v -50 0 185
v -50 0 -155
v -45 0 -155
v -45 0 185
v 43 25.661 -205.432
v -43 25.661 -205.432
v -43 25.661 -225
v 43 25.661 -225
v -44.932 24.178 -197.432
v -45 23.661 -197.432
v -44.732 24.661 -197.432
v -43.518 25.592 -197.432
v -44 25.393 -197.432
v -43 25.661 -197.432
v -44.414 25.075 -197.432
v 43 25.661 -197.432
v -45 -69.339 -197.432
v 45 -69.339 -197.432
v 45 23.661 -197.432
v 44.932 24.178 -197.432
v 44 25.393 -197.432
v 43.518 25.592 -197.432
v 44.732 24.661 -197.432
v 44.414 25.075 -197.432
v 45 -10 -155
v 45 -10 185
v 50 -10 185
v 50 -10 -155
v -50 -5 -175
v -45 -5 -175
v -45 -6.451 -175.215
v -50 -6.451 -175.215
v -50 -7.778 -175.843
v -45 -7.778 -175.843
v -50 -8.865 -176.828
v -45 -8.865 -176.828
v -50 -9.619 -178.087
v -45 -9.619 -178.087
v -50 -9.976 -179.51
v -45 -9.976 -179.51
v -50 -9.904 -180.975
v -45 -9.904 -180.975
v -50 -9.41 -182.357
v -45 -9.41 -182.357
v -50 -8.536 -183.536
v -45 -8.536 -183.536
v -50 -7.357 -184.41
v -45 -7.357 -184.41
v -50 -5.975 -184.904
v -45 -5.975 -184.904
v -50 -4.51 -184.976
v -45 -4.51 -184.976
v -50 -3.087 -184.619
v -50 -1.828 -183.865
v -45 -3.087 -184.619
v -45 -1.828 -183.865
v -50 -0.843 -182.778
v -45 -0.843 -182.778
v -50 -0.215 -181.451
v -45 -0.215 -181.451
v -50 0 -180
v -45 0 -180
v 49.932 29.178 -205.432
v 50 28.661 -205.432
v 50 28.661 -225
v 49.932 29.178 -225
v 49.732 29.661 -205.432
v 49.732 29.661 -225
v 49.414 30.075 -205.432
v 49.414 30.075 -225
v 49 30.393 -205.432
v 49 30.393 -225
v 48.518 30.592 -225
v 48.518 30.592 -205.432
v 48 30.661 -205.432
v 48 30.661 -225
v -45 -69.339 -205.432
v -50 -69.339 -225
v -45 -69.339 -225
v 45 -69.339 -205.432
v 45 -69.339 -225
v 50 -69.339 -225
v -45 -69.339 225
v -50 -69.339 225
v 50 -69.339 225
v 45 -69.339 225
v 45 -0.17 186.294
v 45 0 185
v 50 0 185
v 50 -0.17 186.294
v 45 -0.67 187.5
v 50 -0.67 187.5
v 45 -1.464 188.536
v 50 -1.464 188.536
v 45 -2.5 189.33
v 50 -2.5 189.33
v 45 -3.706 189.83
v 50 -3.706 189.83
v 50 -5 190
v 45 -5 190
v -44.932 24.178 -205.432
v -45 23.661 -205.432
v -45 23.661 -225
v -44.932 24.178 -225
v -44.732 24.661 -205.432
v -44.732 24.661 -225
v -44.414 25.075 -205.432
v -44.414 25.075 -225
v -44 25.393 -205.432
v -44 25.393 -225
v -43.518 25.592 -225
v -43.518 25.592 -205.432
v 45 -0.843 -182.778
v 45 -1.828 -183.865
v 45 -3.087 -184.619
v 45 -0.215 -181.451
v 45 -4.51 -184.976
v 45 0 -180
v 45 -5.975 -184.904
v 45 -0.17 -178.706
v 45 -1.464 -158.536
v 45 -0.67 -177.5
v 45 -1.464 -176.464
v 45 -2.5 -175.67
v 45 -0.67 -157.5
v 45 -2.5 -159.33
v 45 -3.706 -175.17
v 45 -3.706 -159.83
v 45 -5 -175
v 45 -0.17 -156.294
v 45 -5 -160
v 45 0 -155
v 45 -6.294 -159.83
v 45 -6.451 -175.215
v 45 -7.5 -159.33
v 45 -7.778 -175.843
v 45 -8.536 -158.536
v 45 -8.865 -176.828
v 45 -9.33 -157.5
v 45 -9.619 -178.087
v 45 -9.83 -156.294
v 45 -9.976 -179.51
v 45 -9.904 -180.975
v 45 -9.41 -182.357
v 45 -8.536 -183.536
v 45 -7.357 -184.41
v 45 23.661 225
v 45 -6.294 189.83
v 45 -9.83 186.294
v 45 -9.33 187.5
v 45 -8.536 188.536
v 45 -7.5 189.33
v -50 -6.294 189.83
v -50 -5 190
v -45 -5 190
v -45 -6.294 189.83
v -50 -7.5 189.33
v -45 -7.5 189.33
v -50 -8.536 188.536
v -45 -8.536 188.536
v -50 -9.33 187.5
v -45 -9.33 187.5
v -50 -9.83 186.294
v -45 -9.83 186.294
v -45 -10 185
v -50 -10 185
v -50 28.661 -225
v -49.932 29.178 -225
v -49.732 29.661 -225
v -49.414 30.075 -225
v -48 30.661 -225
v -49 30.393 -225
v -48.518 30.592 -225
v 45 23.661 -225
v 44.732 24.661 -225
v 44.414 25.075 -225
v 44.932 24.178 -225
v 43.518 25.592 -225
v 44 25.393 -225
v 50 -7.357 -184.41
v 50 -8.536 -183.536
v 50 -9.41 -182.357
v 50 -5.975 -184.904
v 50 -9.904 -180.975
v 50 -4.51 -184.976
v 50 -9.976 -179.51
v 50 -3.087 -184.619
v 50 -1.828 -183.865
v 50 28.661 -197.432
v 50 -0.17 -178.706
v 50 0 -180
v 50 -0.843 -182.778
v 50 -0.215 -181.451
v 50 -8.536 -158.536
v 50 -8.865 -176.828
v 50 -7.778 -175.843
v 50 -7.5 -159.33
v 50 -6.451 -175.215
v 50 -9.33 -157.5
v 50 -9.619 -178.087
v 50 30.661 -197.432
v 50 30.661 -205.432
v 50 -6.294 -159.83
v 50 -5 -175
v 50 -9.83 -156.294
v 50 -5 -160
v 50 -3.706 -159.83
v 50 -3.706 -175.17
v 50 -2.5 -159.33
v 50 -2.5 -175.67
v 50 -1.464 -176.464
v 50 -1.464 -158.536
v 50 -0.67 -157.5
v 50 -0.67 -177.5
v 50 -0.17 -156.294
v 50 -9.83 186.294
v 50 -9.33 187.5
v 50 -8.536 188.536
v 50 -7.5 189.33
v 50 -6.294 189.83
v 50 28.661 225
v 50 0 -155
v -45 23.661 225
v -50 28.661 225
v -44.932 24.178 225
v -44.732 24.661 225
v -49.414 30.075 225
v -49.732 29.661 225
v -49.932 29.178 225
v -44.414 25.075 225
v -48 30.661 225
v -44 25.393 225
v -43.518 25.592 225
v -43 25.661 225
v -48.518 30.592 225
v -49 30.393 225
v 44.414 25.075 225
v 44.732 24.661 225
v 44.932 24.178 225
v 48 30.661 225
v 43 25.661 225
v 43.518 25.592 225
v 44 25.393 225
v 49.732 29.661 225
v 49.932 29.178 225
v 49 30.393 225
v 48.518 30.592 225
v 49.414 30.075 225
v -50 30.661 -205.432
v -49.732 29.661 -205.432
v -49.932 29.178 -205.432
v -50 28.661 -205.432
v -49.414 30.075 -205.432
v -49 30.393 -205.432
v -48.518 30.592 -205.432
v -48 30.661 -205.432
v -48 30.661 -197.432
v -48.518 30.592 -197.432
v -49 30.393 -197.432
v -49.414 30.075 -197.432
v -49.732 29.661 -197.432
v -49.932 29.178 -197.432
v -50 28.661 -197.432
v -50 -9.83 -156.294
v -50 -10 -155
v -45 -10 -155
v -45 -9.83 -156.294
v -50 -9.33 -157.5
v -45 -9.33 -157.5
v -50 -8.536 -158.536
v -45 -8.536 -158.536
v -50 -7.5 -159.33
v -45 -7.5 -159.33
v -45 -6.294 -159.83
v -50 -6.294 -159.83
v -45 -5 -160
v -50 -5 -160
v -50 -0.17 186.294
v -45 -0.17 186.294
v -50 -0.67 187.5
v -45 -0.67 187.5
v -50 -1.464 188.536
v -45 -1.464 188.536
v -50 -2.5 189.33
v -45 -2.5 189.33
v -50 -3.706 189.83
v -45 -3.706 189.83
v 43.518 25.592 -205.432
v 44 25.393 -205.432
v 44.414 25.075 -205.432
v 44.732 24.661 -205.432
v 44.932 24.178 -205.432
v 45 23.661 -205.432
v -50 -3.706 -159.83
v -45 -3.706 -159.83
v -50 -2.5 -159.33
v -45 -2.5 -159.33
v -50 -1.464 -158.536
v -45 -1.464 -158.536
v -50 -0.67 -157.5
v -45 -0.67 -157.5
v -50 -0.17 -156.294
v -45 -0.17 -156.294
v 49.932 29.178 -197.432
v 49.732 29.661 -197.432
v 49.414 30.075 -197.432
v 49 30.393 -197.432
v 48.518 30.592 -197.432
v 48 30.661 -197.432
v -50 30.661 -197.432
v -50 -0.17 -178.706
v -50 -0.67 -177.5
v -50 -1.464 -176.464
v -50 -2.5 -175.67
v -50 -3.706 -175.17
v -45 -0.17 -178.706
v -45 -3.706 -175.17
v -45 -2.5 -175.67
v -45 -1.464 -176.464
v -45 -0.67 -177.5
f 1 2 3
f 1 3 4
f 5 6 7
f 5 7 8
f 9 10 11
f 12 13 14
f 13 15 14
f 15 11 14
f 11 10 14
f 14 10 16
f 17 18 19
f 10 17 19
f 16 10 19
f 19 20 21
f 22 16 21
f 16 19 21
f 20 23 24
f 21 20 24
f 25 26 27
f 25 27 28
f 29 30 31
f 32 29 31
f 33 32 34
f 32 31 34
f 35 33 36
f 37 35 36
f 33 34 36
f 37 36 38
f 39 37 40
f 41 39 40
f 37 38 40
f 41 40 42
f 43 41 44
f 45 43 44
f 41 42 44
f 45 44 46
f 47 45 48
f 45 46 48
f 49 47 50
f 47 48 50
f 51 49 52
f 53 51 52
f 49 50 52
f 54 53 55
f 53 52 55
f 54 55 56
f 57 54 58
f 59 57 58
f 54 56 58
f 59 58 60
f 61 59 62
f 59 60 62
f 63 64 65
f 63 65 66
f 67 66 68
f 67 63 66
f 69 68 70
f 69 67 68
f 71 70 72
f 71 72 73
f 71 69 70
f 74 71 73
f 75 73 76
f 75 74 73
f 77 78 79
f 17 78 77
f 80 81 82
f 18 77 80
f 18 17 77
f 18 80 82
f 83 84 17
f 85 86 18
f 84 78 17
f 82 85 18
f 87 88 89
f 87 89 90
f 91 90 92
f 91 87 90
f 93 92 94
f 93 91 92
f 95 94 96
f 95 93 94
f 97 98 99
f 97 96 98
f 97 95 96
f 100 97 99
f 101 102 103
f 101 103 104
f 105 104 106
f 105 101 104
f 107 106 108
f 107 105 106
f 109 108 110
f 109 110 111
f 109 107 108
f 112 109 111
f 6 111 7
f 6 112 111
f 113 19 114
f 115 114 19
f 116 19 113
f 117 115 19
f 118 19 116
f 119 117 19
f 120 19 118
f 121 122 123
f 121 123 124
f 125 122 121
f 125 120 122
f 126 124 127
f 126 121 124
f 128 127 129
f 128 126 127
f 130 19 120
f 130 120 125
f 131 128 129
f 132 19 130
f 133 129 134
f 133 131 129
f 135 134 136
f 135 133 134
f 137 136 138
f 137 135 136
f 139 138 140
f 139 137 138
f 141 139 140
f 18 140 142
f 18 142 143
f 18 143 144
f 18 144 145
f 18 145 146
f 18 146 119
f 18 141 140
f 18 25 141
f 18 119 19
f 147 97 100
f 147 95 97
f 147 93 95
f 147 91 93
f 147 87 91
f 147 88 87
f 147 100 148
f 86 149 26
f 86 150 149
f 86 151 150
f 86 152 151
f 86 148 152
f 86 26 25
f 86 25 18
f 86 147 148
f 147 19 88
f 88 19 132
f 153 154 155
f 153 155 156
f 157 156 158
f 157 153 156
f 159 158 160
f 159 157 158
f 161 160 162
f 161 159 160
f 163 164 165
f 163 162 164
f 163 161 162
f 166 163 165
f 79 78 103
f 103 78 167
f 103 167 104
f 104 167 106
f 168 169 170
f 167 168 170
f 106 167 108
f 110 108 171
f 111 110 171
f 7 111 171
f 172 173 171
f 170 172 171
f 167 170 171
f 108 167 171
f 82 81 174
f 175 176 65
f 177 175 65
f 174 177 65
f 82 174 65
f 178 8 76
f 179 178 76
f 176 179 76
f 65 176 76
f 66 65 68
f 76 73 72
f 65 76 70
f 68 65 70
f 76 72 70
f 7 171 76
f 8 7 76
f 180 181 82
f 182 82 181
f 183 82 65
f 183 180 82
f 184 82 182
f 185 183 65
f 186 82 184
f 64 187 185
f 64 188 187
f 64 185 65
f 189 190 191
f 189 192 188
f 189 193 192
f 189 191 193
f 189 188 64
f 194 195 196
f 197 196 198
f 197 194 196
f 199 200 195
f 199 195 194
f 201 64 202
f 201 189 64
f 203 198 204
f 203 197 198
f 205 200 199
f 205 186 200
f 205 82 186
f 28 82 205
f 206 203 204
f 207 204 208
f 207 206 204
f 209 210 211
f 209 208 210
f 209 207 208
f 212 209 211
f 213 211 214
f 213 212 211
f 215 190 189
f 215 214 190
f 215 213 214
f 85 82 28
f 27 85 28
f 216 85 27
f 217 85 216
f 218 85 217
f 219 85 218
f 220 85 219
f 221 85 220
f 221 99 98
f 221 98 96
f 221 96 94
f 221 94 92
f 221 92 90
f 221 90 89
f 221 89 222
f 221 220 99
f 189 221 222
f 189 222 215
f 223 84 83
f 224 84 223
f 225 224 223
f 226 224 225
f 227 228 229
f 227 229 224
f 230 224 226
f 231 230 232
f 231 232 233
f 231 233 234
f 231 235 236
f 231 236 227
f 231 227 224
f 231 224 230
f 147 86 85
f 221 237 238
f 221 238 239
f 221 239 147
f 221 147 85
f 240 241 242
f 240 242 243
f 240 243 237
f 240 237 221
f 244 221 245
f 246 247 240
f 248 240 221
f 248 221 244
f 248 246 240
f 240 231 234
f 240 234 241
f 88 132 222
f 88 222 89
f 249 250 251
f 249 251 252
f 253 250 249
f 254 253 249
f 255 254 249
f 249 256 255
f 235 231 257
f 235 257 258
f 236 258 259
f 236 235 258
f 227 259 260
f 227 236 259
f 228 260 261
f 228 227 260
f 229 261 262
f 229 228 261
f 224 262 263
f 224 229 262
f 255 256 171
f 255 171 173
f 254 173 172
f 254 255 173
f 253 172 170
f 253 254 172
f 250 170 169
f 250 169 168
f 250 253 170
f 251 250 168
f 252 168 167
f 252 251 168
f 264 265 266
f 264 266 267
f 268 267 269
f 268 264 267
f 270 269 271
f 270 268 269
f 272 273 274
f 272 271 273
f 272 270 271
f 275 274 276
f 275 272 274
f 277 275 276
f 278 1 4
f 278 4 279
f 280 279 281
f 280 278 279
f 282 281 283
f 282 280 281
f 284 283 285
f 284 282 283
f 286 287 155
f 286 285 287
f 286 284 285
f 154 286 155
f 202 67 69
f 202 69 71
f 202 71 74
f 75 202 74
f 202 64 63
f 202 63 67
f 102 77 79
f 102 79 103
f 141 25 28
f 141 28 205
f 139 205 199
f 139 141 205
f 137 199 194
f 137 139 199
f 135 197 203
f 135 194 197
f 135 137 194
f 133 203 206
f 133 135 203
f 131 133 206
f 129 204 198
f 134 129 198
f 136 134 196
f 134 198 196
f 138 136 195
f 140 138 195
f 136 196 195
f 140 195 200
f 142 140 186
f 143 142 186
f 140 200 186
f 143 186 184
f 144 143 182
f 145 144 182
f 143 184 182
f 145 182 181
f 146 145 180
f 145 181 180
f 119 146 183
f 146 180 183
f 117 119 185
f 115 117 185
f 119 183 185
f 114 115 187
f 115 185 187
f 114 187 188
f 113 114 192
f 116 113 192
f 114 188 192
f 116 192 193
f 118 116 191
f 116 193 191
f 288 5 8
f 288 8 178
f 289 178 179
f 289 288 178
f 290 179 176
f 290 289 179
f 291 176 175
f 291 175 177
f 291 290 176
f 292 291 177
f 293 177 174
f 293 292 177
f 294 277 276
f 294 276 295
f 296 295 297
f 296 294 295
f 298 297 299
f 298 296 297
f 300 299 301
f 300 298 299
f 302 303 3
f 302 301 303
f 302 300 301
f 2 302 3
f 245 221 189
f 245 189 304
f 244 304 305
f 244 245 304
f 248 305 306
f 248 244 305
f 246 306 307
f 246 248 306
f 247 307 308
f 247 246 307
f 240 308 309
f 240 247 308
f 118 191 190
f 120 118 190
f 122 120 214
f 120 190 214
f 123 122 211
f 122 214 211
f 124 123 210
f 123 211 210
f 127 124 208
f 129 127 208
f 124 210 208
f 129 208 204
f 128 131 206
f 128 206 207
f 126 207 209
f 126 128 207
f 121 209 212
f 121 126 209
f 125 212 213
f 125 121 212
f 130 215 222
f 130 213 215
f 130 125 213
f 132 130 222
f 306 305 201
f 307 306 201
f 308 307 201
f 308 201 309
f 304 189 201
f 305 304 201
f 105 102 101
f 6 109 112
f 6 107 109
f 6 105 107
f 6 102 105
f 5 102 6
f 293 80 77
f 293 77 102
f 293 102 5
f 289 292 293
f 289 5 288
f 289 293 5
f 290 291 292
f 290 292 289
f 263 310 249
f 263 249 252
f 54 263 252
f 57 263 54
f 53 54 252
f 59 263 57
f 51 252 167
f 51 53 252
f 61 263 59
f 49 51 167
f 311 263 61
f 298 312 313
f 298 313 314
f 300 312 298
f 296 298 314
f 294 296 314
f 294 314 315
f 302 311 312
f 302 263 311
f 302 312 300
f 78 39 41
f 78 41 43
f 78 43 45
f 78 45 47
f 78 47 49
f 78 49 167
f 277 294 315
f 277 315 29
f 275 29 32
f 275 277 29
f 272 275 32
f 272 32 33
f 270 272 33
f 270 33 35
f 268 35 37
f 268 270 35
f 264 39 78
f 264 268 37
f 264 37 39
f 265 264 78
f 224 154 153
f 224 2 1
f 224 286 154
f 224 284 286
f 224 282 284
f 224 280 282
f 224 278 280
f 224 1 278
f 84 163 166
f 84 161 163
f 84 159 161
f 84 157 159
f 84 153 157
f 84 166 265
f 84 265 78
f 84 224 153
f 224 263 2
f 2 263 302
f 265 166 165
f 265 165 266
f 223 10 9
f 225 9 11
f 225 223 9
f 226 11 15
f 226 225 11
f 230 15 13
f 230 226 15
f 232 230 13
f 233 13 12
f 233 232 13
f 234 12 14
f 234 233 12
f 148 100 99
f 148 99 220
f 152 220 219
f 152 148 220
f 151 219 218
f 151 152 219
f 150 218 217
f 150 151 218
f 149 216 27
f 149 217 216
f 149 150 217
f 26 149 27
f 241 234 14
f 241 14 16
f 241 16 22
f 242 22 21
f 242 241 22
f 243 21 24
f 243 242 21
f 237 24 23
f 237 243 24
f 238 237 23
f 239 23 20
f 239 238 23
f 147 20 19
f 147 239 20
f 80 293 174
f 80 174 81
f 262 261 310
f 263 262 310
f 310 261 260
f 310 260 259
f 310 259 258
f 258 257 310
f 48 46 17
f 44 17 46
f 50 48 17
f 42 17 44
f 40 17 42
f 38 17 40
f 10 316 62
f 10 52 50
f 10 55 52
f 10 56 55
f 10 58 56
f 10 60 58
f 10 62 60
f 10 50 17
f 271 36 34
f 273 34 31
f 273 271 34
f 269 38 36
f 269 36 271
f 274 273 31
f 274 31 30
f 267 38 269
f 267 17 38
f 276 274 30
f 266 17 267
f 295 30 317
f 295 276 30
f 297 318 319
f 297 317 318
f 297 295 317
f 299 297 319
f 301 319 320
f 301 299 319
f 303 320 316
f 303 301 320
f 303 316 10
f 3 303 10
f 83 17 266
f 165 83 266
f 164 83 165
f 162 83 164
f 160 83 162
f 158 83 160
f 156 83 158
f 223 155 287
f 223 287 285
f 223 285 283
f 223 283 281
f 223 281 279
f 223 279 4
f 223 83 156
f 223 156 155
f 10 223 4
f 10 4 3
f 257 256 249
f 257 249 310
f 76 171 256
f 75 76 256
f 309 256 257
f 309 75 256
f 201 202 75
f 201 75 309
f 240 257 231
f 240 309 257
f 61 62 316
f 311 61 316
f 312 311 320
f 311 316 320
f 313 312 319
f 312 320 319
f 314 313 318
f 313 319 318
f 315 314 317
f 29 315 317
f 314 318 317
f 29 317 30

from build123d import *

# Parameters (mm, degrees)
F1_DEPTH = 225
F3_DEPTH = 60
F2_W     = 100
F2_H     = 8
F4_DEPTH = 50


with BuildPart() as f1:
    # F0 (on Top) → F1 (new body, symmetric)
    with BuildSketch(Plane.XY):
        with BuildLine():
            Line((-50, 28.660538), (-50, -69.339462))
            Line((-50, -69.339462), (-45, -69.339462))
            Line((-45, -69.339462), (-45, 23.660538))
            ThreePointArc((-45, 23.660538), (-44.414214, 25.074752), (-43, 25.660538))
            Line((-43, 25.660538), (43, 25.660538))
            ThreePointArc((43, 25.660538), (44.414214, 25.074752), (45, 23.660538))
            Line((45, 23.660538), (45, -69.339462))
            Line((45, -69.339462), (50, -69.339462))
            Line((50, -69.339462), (50, 28.660538))
            ThreePointArc((50, 28.660538), (49.414214, 30.074752), (48, 30.660538))
            Line((48, 30.660538), (-48, 30.660538))
            ThreePointArc((-48, 30.660538), (-49.414214, 30.074752), (-50, 28.660538))
        make_face()
    extrude(amount=F1_DEPTH, both=True)

    # F2 (on Right) → F3 (cut, symmetric)
    with BuildSketch(Plane.YZ):
        with BuildLine():
            Line((0, -155), (0, 185))
            ThreePointArc((0, 185), (-1.464466, 188.535534), (-5, 190))
            ThreePointArc((-5, 190), (-8.535534, 188.535534), (-10, 185))
            Line((-10, 185), (-10, -155))
            ThreePointArc((-10, -155), (-8.535534, -158.535534), (-5, -160))
            ThreePointArc((-5, -160), (-1.464466, -158.535534), (0, -155))
        make_face()
        with BuildLine():
            ThreePointArc((0, -180), (-1.464466, -176.464466), (-5, -175))
            ThreePointArc((-5, -175), (-8.535534, -183.535534), (0, -180))
        make_face()
    extrude(amount=F3_DEPTH, both=True, mode=Mode.SUBTRACT)

    # F2 (on Right) → F4 (join, symmetric)
    with BuildSketch(Plane.YZ):
        with Locations((-19.339462, -201.432384)):
            Rectangle(F2_W, F2_H)
    extrude(amount=F4_DEPTH, both=True)


solid = f1.part
